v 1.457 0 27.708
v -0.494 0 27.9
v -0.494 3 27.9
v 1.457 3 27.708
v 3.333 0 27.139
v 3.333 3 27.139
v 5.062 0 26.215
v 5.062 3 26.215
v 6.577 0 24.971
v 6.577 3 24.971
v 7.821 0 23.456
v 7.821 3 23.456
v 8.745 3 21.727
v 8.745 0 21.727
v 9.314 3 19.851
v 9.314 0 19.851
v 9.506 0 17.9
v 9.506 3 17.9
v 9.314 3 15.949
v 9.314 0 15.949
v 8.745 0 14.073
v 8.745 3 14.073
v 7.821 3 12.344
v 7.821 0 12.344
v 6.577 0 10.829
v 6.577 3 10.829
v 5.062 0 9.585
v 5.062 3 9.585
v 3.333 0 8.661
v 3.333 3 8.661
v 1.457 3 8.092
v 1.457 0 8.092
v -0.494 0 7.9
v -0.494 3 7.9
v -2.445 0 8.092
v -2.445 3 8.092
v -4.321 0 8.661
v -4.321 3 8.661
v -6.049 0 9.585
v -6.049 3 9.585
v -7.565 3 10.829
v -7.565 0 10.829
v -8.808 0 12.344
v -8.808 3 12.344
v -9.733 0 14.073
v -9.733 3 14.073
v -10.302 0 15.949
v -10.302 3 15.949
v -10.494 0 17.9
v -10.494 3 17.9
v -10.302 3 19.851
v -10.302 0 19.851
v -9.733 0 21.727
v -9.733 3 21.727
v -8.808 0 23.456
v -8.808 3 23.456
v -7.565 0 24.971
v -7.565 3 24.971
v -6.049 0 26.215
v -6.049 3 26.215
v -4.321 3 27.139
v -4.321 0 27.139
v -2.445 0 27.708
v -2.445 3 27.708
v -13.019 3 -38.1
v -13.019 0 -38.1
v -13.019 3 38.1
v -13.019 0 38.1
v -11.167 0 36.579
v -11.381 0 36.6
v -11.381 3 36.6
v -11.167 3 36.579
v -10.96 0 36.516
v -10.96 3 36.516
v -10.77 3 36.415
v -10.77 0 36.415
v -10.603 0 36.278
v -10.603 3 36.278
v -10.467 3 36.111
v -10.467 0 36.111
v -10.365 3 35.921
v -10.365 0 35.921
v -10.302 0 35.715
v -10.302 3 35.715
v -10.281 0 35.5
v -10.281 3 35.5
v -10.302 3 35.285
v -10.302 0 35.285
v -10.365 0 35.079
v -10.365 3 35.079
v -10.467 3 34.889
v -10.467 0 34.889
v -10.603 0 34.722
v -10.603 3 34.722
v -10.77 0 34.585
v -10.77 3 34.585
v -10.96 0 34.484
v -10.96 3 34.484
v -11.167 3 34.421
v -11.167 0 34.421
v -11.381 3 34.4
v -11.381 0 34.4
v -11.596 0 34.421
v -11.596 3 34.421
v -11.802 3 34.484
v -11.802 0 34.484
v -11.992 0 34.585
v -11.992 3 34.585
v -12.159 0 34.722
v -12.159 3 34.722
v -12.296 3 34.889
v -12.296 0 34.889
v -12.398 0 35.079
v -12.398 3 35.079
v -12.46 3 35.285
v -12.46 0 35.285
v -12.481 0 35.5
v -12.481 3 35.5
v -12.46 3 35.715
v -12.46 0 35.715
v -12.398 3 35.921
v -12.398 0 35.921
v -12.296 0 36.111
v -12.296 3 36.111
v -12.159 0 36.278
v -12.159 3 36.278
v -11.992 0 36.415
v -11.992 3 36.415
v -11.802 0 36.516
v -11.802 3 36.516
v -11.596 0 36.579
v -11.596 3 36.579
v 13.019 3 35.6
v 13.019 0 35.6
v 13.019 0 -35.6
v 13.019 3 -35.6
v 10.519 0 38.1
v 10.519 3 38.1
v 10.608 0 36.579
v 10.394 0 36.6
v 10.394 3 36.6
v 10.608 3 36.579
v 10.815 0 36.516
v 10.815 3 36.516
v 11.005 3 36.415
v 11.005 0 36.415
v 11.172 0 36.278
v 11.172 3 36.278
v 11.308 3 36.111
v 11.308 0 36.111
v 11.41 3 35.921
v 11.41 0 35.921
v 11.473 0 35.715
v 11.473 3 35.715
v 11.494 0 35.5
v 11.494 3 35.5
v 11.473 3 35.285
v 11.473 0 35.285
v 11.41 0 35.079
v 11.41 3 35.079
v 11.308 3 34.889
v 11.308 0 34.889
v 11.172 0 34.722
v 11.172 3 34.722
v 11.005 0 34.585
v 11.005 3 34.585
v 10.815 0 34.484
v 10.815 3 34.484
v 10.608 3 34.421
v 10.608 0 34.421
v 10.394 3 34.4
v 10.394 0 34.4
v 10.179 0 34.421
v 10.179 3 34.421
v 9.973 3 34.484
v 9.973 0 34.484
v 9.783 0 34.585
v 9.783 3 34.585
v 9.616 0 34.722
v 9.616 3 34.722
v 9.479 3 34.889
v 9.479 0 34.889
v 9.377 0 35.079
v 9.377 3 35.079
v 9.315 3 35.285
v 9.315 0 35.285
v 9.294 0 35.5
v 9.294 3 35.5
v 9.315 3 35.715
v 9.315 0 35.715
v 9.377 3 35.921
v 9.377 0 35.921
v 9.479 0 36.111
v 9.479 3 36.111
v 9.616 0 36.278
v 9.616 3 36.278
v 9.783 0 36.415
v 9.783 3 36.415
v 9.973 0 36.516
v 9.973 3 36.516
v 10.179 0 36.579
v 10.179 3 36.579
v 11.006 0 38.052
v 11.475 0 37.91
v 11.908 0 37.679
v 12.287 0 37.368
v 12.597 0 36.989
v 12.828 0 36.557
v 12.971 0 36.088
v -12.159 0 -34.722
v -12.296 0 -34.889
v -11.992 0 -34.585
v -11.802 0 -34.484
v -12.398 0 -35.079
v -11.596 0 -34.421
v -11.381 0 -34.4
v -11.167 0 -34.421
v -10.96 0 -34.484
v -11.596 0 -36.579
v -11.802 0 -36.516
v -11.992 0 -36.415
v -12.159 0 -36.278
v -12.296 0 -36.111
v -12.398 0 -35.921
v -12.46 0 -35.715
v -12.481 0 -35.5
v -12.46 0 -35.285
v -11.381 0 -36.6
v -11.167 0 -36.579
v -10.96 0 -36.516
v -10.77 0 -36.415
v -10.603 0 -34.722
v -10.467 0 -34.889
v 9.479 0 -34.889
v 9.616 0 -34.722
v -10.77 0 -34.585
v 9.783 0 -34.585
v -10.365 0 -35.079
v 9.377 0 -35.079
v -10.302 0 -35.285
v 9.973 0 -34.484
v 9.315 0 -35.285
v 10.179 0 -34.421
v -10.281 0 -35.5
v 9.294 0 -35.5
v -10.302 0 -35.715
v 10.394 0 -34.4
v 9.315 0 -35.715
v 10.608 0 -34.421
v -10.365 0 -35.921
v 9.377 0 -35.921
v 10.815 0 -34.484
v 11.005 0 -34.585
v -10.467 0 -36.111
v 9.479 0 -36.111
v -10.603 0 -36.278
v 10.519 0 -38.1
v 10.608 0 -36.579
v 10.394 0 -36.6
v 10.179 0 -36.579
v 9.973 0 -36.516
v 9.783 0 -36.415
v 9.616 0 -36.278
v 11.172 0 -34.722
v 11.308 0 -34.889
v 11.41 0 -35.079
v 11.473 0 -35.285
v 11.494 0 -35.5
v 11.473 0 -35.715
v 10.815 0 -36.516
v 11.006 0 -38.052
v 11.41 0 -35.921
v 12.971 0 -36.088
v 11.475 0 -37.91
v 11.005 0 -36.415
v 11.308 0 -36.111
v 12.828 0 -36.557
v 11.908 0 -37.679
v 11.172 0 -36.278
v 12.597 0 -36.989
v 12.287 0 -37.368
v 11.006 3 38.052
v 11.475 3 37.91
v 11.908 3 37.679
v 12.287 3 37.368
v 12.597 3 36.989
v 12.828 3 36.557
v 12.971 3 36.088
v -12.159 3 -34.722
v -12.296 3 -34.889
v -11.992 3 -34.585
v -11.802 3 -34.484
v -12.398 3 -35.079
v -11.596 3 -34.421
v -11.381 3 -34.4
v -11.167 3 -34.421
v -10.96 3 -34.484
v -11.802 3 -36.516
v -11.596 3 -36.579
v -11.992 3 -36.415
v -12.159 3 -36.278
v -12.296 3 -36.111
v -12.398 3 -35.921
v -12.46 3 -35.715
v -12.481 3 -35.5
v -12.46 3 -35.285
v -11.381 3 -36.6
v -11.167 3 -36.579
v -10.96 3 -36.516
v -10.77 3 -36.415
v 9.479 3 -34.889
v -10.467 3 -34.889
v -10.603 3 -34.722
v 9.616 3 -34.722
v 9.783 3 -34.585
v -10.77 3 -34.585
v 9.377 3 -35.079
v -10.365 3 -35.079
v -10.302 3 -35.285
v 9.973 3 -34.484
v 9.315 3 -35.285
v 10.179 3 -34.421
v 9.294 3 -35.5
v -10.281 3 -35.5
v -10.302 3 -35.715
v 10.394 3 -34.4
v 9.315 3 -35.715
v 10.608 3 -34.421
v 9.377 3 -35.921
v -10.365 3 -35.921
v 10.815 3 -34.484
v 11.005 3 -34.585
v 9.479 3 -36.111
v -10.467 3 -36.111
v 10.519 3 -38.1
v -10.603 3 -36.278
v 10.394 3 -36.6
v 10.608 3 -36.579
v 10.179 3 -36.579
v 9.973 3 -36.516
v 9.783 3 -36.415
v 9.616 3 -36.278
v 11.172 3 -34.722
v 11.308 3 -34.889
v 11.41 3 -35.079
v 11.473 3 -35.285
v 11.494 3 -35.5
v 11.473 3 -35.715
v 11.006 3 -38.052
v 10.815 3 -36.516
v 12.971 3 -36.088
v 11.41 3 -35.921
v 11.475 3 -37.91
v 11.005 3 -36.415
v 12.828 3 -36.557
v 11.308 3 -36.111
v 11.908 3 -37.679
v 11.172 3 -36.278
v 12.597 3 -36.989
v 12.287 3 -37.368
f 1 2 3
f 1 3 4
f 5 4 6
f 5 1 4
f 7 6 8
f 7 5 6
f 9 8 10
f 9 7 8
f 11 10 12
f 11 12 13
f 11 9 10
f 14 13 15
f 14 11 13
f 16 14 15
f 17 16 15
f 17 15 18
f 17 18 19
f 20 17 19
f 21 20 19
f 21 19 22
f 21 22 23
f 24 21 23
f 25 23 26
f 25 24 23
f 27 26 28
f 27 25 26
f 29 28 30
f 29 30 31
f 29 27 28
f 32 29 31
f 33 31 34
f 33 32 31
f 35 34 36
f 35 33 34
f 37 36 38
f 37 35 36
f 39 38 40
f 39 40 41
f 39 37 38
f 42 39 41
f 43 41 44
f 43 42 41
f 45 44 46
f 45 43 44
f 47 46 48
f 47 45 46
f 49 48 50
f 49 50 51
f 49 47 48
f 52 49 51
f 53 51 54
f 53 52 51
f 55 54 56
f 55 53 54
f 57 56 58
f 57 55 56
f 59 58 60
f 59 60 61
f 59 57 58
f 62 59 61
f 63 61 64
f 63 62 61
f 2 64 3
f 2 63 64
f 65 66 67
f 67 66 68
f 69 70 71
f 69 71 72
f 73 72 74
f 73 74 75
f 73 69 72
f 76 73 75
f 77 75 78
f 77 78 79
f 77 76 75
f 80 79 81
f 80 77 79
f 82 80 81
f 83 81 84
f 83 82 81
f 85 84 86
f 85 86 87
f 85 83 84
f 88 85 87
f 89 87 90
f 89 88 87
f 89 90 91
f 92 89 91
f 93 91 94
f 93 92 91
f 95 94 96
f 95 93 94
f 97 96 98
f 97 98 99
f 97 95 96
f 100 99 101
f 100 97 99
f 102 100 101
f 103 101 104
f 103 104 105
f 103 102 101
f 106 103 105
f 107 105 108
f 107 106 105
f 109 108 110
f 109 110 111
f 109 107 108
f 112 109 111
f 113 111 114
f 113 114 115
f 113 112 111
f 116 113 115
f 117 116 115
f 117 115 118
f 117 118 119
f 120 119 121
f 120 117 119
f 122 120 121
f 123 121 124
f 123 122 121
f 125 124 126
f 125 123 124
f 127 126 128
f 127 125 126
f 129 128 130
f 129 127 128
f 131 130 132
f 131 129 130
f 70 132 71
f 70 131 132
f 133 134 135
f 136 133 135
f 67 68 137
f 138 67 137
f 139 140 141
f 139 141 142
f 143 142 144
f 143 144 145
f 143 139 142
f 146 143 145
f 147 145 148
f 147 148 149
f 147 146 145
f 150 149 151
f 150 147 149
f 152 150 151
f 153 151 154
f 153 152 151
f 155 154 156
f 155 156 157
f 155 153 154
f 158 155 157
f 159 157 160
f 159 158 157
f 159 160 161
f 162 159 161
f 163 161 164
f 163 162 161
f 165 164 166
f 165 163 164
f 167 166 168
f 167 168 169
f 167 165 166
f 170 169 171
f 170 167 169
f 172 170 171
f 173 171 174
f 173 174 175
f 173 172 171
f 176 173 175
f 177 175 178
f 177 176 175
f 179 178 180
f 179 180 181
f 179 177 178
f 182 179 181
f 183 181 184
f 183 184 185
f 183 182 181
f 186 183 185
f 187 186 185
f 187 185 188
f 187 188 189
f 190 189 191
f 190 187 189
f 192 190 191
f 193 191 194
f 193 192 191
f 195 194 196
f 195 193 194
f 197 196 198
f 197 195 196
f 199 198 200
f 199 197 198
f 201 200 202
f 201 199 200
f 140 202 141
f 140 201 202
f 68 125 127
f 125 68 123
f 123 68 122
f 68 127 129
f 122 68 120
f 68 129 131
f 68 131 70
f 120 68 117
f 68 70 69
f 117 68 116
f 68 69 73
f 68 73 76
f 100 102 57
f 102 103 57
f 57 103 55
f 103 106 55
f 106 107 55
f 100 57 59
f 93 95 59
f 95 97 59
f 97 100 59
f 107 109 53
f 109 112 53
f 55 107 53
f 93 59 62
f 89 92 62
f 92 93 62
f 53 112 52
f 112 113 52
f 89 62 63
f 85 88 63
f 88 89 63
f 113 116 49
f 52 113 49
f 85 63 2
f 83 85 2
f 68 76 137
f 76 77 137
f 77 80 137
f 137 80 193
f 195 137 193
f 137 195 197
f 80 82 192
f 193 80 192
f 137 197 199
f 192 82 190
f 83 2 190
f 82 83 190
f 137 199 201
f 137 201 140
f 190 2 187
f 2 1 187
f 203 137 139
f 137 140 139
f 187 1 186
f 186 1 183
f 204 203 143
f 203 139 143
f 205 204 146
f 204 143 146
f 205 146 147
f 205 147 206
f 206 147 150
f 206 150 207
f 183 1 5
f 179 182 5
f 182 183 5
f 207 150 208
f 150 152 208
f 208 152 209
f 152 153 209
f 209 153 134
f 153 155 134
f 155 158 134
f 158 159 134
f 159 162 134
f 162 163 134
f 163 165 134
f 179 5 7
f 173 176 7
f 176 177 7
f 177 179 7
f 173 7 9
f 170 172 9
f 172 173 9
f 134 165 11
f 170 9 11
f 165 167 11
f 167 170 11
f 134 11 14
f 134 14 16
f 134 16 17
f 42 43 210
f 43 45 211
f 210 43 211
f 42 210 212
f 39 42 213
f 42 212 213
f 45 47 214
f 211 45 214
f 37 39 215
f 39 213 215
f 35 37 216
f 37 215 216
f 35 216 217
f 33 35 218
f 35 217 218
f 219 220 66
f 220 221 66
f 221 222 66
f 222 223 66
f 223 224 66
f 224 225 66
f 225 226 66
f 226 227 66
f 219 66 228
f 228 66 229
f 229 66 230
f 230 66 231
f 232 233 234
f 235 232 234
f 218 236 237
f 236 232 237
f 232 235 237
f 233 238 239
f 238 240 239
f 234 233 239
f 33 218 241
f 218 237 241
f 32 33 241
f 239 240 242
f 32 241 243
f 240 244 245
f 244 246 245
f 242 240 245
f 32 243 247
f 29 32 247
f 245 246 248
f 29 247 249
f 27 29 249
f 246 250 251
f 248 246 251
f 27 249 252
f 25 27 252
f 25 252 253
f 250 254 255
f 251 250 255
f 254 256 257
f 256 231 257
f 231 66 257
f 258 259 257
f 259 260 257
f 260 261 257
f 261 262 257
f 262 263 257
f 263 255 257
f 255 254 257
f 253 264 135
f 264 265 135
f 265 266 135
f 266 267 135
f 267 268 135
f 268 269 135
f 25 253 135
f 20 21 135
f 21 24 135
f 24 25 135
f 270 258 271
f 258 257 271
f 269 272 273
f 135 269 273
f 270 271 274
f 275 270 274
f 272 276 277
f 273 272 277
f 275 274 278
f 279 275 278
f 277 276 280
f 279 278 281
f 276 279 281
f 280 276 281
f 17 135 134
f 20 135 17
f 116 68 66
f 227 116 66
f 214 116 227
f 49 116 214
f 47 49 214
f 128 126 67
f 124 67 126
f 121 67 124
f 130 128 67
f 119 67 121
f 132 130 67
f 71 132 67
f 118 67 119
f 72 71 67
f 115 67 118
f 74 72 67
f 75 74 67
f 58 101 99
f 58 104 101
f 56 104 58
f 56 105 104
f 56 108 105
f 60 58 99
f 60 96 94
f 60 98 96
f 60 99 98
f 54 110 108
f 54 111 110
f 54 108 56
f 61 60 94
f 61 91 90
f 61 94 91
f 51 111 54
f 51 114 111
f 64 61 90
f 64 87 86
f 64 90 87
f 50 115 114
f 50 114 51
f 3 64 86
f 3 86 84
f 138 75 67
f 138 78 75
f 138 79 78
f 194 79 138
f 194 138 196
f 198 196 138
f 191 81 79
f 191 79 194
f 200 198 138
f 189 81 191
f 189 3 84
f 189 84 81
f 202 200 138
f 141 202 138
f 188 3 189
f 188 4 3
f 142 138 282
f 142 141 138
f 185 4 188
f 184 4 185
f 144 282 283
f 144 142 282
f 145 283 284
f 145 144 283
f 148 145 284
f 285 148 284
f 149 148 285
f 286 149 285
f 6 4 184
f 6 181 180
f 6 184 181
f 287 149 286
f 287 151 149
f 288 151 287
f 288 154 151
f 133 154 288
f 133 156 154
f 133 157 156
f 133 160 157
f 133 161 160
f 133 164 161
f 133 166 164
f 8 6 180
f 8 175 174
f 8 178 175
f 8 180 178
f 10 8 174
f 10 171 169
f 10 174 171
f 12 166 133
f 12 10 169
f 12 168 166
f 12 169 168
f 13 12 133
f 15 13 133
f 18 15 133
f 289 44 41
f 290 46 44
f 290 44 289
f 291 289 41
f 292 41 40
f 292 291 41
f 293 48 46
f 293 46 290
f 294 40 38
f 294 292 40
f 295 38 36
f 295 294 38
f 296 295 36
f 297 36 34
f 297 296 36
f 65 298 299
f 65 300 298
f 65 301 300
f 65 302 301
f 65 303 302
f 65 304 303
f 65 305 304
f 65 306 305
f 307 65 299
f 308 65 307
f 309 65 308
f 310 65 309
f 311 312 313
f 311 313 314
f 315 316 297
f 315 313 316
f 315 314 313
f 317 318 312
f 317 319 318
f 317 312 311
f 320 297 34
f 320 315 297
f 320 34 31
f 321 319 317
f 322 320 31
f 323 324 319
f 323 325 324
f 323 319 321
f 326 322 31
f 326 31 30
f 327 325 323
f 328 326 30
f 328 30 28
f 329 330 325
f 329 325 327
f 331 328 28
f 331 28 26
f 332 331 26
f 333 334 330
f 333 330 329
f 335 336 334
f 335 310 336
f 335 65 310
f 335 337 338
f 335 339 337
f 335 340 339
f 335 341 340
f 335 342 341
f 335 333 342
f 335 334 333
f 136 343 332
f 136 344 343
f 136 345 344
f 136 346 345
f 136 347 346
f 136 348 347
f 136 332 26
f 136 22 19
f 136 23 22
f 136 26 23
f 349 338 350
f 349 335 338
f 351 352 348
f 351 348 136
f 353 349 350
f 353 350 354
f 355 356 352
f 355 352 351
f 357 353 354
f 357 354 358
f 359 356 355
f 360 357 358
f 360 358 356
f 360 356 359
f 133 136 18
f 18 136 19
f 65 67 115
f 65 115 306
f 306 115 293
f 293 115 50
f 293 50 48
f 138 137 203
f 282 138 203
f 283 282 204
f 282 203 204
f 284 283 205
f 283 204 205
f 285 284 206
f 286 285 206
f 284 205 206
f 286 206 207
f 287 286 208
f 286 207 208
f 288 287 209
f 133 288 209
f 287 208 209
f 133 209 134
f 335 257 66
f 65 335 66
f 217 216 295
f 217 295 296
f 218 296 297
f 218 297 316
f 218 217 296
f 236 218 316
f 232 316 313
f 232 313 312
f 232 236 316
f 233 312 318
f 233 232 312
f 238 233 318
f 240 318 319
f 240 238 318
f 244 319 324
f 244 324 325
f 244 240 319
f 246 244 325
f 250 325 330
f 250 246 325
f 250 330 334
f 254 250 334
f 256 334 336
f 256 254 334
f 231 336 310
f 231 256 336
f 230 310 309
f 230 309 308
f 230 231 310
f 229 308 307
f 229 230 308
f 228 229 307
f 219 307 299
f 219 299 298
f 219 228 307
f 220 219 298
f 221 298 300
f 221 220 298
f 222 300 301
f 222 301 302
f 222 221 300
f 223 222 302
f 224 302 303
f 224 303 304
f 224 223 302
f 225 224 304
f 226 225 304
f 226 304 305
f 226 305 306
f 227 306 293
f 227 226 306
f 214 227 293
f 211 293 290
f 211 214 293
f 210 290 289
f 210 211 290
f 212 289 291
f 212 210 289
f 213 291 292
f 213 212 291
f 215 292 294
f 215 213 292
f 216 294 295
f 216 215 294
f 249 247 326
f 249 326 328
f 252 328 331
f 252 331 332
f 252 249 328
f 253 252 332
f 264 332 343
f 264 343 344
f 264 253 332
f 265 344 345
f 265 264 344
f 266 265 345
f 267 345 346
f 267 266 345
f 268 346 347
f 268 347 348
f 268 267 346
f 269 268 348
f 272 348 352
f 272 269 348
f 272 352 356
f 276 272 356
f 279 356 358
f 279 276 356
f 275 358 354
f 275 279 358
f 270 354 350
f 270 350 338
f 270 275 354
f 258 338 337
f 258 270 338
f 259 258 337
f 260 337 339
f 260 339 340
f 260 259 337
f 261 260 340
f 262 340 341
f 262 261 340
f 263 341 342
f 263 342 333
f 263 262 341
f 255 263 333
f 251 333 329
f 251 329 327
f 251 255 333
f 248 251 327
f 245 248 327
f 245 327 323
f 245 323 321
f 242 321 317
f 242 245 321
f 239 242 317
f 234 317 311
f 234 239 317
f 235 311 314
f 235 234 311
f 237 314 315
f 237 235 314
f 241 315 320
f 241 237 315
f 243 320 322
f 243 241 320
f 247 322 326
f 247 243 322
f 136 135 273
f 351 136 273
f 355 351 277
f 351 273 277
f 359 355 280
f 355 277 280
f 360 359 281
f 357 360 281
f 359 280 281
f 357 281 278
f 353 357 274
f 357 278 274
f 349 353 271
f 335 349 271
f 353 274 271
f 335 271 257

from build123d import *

# Parameters (mm, degrees)
SKETCH1_R           = 1.1
SKETCH1_R_2         = 10
BOSS_EXTRUDE1_DEPTH = 3


with BuildPart() as part:
    # Sketch1 → Boss-Extrude1 (new body)
    with BuildSketch(Plane(origin=(0, 0, 0), x_dir=(1, 0, 0), z_dir=(0, 1, 0))):
        with BuildLine():
            Line((-13.01875, -38.1), (10.51875, -38.1))
            ThreePointArc((10.51875, -38.1), (12.286516953, -37.367766953), (13.01875, -35.6))
            Line((13.01875, -35.6), (13.01875, 35.6))
            ThreePointArc((13.01875, 35.6), (12.286516953, 37.367766953), (10.51875, 38.1))
            Line((10.51875, 38.1), (-13.01875, 38.1))
            Line((-13.01875, 38.1), (-13.01875, -38.1))
        make_face()
        with Locations(Location((-11.38125, 35.5, 0), (0, 0, 270))):
            Circle(SKETCH1_R, mode=Mode.SUBTRACT)
        with Locations(Location((10.39375, 35.5, 0), (0, 0, 270))):
            Circle(SKETCH1_R, mode=Mode.SUBTRACT)
        with Locations(Location((-11.38125, -35.5, 0), (0, 0, 270))):
            Circle(SKETCH1_R, mode=Mode.SUBTRACT)
        with Locations(Location((10.39375, -35.5, 0), (0, 0, 270))):
            Circle(SKETCH1_R, mode=Mode.SUBTRACT)
        with Locations(Location((-0.49375, -17.9, 0), (0, 0, 270))):
            Circle(SKETCH1_R_2, mode=Mode.SUBTRACT)
    extrude(amount=BOSS_EXTRUDE1_DEPTH)


solid = part.part
